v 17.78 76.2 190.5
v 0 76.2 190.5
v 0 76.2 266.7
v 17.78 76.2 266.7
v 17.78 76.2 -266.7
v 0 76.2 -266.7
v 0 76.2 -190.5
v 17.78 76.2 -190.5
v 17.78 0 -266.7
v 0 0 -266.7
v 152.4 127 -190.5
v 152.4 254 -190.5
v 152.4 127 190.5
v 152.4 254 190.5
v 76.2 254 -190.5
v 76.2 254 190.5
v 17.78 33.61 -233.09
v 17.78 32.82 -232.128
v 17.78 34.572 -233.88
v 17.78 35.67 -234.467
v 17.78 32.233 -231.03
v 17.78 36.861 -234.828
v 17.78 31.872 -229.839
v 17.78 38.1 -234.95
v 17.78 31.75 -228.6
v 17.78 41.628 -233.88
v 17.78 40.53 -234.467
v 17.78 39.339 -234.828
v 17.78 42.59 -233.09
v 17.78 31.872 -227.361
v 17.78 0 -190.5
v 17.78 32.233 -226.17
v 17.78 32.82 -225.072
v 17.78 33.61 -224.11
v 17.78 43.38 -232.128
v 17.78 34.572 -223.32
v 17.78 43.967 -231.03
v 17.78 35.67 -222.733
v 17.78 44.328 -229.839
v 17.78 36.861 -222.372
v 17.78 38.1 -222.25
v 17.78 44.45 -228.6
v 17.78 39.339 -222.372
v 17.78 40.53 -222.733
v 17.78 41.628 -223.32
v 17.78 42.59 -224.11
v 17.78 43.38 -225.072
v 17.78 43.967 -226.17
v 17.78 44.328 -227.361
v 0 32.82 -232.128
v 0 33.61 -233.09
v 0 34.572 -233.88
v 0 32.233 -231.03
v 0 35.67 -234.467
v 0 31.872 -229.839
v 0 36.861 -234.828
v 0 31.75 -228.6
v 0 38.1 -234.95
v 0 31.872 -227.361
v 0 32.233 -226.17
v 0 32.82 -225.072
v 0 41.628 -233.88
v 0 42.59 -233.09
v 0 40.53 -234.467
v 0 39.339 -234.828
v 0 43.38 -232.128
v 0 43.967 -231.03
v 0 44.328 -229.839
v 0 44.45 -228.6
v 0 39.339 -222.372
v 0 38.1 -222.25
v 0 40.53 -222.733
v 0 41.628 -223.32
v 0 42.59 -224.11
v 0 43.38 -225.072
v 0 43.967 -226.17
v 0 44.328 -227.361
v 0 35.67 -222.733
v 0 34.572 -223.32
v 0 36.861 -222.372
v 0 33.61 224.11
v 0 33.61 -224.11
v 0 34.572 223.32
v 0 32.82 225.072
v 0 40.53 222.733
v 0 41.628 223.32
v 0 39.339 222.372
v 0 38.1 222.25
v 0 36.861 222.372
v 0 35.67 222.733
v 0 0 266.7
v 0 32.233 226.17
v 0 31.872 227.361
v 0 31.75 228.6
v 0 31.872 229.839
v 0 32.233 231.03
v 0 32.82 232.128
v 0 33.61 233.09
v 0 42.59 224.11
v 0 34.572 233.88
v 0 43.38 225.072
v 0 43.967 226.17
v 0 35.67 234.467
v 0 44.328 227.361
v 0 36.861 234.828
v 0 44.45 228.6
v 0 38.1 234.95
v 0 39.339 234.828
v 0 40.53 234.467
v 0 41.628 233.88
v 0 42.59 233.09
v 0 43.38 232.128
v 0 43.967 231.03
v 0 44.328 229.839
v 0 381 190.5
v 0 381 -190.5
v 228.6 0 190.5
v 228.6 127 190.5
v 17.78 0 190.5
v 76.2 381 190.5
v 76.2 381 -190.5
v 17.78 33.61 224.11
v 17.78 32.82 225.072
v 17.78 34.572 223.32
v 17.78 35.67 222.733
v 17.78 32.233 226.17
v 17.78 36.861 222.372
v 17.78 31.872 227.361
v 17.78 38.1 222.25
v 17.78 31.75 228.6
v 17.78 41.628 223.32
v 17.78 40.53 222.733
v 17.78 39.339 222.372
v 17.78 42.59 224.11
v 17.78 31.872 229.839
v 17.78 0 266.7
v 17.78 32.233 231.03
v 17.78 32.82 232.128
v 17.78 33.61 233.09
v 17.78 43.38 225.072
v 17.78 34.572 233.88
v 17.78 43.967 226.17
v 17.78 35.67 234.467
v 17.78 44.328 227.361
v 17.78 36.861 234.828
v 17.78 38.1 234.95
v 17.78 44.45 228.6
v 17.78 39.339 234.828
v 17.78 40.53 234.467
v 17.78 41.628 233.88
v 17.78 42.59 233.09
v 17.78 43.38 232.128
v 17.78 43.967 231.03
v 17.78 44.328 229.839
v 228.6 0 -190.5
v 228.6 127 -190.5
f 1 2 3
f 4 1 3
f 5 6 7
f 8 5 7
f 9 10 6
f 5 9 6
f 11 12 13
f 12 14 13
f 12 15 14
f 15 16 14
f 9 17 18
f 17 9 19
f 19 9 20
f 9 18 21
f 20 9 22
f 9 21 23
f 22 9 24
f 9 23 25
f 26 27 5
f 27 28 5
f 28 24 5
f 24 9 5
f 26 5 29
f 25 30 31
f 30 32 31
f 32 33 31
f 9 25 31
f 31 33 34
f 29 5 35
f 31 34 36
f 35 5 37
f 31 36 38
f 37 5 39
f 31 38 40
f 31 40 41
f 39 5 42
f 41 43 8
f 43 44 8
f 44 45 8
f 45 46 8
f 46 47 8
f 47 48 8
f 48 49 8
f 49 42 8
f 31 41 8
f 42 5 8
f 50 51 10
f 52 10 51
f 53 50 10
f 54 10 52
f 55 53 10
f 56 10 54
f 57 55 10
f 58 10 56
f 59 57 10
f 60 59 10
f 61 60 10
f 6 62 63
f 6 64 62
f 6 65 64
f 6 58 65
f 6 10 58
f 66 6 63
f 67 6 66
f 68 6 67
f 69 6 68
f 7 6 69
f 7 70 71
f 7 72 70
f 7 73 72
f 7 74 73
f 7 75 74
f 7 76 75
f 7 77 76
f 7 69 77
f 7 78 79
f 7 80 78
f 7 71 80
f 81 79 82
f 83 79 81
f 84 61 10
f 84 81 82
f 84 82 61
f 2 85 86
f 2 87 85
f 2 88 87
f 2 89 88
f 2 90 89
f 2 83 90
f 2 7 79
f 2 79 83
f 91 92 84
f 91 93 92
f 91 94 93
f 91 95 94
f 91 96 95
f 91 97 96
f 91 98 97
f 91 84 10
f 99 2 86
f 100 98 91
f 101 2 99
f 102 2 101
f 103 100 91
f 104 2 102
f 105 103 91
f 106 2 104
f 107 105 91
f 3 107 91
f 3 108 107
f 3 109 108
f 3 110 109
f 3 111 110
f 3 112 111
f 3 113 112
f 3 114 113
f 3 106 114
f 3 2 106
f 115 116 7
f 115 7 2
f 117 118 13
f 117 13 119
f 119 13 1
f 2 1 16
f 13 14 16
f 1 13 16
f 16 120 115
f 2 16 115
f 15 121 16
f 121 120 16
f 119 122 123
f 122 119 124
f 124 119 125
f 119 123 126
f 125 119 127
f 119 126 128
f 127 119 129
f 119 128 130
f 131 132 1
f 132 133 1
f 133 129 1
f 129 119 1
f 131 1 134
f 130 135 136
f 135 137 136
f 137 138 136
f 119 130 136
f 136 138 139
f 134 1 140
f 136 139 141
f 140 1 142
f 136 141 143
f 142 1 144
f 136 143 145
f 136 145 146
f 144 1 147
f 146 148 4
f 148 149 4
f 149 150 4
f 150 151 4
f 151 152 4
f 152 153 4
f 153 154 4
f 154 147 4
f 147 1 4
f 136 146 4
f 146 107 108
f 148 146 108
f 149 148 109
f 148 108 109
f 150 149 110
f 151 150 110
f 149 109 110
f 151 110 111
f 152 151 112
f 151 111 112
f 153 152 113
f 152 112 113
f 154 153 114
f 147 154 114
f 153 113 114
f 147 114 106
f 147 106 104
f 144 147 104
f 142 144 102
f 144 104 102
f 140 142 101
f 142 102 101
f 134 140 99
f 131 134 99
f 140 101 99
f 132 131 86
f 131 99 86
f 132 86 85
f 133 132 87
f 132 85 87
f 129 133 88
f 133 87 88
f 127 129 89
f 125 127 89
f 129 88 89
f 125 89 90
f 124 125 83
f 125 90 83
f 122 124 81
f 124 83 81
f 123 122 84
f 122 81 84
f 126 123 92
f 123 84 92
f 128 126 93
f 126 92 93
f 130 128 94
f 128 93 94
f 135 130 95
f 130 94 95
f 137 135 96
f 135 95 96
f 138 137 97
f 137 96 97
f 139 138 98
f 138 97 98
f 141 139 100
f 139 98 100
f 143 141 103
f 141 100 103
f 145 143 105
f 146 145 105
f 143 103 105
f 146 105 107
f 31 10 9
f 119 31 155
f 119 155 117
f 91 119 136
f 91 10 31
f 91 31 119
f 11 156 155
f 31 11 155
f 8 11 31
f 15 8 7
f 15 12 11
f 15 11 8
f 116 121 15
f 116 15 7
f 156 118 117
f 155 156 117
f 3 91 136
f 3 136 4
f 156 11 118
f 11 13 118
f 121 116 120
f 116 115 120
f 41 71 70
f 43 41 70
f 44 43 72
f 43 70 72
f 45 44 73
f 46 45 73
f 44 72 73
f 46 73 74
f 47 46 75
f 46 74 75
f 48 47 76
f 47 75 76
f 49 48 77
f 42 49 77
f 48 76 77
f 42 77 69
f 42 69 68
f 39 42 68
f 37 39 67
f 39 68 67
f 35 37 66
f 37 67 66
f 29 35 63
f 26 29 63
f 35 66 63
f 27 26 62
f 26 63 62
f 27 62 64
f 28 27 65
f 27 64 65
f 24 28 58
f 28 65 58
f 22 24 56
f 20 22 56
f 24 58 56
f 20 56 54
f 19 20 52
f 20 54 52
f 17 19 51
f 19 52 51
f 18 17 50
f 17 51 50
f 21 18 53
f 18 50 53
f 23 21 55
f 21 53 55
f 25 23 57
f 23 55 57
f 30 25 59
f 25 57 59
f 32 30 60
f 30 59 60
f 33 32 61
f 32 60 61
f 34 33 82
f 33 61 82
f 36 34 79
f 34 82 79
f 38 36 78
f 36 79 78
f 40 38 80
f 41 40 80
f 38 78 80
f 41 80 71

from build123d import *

# Parameters (mm, degrees)
BOSS_EXTRUDE1_DEPTH = 190.5
SKETCH2_W           = 76.2
SKETCH2_H           = 76.2
SKETCH2_R           = 6.35
BOSS_EXTRUDE2_DEPTH = 17.78


with BuildPart() as part:
    # Sketch1 → Boss-Extrude1 (new, symmetric)
    with BuildSketch(Plane.XY):
        Polygon((0, 0), (0, 381), (76.2, 381), (76.2, 254), (152.4, 254), (152.4, 127), (228.6, 127), (228.6, 0), align=None)
    extrude(amount=BOSS_EXTRUDE1_DEPTH, both=True)

    # Sketch2 → Boss-Extrude2 (add)
    # profile 1 of 2: a face of its own
    with BuildSketch(Plane.ZY):
        with Locations((228.6, 38.1)):
            Rectangle(SKETCH2_W, SKETCH2_H)
        with Locations((228.6, 38.1)):
            Circle(SKETCH2_R, mode=Mode.SUBTRACT)
    # profile 2 of 2: a face of its own
    with BuildSketch(Plane.ZY):
        with Locations((-228.6, 38.1)):
            Rectangle(SKETCH2_W, SKETCH2_H)
        with Locations((-228.6, 38.1)):
            Circle(SKETCH2_R, mode=Mode.SUBTRACT)
    extrude(amount=-BOSS_EXTRUDE2_DEPTH)


solid = part.part
